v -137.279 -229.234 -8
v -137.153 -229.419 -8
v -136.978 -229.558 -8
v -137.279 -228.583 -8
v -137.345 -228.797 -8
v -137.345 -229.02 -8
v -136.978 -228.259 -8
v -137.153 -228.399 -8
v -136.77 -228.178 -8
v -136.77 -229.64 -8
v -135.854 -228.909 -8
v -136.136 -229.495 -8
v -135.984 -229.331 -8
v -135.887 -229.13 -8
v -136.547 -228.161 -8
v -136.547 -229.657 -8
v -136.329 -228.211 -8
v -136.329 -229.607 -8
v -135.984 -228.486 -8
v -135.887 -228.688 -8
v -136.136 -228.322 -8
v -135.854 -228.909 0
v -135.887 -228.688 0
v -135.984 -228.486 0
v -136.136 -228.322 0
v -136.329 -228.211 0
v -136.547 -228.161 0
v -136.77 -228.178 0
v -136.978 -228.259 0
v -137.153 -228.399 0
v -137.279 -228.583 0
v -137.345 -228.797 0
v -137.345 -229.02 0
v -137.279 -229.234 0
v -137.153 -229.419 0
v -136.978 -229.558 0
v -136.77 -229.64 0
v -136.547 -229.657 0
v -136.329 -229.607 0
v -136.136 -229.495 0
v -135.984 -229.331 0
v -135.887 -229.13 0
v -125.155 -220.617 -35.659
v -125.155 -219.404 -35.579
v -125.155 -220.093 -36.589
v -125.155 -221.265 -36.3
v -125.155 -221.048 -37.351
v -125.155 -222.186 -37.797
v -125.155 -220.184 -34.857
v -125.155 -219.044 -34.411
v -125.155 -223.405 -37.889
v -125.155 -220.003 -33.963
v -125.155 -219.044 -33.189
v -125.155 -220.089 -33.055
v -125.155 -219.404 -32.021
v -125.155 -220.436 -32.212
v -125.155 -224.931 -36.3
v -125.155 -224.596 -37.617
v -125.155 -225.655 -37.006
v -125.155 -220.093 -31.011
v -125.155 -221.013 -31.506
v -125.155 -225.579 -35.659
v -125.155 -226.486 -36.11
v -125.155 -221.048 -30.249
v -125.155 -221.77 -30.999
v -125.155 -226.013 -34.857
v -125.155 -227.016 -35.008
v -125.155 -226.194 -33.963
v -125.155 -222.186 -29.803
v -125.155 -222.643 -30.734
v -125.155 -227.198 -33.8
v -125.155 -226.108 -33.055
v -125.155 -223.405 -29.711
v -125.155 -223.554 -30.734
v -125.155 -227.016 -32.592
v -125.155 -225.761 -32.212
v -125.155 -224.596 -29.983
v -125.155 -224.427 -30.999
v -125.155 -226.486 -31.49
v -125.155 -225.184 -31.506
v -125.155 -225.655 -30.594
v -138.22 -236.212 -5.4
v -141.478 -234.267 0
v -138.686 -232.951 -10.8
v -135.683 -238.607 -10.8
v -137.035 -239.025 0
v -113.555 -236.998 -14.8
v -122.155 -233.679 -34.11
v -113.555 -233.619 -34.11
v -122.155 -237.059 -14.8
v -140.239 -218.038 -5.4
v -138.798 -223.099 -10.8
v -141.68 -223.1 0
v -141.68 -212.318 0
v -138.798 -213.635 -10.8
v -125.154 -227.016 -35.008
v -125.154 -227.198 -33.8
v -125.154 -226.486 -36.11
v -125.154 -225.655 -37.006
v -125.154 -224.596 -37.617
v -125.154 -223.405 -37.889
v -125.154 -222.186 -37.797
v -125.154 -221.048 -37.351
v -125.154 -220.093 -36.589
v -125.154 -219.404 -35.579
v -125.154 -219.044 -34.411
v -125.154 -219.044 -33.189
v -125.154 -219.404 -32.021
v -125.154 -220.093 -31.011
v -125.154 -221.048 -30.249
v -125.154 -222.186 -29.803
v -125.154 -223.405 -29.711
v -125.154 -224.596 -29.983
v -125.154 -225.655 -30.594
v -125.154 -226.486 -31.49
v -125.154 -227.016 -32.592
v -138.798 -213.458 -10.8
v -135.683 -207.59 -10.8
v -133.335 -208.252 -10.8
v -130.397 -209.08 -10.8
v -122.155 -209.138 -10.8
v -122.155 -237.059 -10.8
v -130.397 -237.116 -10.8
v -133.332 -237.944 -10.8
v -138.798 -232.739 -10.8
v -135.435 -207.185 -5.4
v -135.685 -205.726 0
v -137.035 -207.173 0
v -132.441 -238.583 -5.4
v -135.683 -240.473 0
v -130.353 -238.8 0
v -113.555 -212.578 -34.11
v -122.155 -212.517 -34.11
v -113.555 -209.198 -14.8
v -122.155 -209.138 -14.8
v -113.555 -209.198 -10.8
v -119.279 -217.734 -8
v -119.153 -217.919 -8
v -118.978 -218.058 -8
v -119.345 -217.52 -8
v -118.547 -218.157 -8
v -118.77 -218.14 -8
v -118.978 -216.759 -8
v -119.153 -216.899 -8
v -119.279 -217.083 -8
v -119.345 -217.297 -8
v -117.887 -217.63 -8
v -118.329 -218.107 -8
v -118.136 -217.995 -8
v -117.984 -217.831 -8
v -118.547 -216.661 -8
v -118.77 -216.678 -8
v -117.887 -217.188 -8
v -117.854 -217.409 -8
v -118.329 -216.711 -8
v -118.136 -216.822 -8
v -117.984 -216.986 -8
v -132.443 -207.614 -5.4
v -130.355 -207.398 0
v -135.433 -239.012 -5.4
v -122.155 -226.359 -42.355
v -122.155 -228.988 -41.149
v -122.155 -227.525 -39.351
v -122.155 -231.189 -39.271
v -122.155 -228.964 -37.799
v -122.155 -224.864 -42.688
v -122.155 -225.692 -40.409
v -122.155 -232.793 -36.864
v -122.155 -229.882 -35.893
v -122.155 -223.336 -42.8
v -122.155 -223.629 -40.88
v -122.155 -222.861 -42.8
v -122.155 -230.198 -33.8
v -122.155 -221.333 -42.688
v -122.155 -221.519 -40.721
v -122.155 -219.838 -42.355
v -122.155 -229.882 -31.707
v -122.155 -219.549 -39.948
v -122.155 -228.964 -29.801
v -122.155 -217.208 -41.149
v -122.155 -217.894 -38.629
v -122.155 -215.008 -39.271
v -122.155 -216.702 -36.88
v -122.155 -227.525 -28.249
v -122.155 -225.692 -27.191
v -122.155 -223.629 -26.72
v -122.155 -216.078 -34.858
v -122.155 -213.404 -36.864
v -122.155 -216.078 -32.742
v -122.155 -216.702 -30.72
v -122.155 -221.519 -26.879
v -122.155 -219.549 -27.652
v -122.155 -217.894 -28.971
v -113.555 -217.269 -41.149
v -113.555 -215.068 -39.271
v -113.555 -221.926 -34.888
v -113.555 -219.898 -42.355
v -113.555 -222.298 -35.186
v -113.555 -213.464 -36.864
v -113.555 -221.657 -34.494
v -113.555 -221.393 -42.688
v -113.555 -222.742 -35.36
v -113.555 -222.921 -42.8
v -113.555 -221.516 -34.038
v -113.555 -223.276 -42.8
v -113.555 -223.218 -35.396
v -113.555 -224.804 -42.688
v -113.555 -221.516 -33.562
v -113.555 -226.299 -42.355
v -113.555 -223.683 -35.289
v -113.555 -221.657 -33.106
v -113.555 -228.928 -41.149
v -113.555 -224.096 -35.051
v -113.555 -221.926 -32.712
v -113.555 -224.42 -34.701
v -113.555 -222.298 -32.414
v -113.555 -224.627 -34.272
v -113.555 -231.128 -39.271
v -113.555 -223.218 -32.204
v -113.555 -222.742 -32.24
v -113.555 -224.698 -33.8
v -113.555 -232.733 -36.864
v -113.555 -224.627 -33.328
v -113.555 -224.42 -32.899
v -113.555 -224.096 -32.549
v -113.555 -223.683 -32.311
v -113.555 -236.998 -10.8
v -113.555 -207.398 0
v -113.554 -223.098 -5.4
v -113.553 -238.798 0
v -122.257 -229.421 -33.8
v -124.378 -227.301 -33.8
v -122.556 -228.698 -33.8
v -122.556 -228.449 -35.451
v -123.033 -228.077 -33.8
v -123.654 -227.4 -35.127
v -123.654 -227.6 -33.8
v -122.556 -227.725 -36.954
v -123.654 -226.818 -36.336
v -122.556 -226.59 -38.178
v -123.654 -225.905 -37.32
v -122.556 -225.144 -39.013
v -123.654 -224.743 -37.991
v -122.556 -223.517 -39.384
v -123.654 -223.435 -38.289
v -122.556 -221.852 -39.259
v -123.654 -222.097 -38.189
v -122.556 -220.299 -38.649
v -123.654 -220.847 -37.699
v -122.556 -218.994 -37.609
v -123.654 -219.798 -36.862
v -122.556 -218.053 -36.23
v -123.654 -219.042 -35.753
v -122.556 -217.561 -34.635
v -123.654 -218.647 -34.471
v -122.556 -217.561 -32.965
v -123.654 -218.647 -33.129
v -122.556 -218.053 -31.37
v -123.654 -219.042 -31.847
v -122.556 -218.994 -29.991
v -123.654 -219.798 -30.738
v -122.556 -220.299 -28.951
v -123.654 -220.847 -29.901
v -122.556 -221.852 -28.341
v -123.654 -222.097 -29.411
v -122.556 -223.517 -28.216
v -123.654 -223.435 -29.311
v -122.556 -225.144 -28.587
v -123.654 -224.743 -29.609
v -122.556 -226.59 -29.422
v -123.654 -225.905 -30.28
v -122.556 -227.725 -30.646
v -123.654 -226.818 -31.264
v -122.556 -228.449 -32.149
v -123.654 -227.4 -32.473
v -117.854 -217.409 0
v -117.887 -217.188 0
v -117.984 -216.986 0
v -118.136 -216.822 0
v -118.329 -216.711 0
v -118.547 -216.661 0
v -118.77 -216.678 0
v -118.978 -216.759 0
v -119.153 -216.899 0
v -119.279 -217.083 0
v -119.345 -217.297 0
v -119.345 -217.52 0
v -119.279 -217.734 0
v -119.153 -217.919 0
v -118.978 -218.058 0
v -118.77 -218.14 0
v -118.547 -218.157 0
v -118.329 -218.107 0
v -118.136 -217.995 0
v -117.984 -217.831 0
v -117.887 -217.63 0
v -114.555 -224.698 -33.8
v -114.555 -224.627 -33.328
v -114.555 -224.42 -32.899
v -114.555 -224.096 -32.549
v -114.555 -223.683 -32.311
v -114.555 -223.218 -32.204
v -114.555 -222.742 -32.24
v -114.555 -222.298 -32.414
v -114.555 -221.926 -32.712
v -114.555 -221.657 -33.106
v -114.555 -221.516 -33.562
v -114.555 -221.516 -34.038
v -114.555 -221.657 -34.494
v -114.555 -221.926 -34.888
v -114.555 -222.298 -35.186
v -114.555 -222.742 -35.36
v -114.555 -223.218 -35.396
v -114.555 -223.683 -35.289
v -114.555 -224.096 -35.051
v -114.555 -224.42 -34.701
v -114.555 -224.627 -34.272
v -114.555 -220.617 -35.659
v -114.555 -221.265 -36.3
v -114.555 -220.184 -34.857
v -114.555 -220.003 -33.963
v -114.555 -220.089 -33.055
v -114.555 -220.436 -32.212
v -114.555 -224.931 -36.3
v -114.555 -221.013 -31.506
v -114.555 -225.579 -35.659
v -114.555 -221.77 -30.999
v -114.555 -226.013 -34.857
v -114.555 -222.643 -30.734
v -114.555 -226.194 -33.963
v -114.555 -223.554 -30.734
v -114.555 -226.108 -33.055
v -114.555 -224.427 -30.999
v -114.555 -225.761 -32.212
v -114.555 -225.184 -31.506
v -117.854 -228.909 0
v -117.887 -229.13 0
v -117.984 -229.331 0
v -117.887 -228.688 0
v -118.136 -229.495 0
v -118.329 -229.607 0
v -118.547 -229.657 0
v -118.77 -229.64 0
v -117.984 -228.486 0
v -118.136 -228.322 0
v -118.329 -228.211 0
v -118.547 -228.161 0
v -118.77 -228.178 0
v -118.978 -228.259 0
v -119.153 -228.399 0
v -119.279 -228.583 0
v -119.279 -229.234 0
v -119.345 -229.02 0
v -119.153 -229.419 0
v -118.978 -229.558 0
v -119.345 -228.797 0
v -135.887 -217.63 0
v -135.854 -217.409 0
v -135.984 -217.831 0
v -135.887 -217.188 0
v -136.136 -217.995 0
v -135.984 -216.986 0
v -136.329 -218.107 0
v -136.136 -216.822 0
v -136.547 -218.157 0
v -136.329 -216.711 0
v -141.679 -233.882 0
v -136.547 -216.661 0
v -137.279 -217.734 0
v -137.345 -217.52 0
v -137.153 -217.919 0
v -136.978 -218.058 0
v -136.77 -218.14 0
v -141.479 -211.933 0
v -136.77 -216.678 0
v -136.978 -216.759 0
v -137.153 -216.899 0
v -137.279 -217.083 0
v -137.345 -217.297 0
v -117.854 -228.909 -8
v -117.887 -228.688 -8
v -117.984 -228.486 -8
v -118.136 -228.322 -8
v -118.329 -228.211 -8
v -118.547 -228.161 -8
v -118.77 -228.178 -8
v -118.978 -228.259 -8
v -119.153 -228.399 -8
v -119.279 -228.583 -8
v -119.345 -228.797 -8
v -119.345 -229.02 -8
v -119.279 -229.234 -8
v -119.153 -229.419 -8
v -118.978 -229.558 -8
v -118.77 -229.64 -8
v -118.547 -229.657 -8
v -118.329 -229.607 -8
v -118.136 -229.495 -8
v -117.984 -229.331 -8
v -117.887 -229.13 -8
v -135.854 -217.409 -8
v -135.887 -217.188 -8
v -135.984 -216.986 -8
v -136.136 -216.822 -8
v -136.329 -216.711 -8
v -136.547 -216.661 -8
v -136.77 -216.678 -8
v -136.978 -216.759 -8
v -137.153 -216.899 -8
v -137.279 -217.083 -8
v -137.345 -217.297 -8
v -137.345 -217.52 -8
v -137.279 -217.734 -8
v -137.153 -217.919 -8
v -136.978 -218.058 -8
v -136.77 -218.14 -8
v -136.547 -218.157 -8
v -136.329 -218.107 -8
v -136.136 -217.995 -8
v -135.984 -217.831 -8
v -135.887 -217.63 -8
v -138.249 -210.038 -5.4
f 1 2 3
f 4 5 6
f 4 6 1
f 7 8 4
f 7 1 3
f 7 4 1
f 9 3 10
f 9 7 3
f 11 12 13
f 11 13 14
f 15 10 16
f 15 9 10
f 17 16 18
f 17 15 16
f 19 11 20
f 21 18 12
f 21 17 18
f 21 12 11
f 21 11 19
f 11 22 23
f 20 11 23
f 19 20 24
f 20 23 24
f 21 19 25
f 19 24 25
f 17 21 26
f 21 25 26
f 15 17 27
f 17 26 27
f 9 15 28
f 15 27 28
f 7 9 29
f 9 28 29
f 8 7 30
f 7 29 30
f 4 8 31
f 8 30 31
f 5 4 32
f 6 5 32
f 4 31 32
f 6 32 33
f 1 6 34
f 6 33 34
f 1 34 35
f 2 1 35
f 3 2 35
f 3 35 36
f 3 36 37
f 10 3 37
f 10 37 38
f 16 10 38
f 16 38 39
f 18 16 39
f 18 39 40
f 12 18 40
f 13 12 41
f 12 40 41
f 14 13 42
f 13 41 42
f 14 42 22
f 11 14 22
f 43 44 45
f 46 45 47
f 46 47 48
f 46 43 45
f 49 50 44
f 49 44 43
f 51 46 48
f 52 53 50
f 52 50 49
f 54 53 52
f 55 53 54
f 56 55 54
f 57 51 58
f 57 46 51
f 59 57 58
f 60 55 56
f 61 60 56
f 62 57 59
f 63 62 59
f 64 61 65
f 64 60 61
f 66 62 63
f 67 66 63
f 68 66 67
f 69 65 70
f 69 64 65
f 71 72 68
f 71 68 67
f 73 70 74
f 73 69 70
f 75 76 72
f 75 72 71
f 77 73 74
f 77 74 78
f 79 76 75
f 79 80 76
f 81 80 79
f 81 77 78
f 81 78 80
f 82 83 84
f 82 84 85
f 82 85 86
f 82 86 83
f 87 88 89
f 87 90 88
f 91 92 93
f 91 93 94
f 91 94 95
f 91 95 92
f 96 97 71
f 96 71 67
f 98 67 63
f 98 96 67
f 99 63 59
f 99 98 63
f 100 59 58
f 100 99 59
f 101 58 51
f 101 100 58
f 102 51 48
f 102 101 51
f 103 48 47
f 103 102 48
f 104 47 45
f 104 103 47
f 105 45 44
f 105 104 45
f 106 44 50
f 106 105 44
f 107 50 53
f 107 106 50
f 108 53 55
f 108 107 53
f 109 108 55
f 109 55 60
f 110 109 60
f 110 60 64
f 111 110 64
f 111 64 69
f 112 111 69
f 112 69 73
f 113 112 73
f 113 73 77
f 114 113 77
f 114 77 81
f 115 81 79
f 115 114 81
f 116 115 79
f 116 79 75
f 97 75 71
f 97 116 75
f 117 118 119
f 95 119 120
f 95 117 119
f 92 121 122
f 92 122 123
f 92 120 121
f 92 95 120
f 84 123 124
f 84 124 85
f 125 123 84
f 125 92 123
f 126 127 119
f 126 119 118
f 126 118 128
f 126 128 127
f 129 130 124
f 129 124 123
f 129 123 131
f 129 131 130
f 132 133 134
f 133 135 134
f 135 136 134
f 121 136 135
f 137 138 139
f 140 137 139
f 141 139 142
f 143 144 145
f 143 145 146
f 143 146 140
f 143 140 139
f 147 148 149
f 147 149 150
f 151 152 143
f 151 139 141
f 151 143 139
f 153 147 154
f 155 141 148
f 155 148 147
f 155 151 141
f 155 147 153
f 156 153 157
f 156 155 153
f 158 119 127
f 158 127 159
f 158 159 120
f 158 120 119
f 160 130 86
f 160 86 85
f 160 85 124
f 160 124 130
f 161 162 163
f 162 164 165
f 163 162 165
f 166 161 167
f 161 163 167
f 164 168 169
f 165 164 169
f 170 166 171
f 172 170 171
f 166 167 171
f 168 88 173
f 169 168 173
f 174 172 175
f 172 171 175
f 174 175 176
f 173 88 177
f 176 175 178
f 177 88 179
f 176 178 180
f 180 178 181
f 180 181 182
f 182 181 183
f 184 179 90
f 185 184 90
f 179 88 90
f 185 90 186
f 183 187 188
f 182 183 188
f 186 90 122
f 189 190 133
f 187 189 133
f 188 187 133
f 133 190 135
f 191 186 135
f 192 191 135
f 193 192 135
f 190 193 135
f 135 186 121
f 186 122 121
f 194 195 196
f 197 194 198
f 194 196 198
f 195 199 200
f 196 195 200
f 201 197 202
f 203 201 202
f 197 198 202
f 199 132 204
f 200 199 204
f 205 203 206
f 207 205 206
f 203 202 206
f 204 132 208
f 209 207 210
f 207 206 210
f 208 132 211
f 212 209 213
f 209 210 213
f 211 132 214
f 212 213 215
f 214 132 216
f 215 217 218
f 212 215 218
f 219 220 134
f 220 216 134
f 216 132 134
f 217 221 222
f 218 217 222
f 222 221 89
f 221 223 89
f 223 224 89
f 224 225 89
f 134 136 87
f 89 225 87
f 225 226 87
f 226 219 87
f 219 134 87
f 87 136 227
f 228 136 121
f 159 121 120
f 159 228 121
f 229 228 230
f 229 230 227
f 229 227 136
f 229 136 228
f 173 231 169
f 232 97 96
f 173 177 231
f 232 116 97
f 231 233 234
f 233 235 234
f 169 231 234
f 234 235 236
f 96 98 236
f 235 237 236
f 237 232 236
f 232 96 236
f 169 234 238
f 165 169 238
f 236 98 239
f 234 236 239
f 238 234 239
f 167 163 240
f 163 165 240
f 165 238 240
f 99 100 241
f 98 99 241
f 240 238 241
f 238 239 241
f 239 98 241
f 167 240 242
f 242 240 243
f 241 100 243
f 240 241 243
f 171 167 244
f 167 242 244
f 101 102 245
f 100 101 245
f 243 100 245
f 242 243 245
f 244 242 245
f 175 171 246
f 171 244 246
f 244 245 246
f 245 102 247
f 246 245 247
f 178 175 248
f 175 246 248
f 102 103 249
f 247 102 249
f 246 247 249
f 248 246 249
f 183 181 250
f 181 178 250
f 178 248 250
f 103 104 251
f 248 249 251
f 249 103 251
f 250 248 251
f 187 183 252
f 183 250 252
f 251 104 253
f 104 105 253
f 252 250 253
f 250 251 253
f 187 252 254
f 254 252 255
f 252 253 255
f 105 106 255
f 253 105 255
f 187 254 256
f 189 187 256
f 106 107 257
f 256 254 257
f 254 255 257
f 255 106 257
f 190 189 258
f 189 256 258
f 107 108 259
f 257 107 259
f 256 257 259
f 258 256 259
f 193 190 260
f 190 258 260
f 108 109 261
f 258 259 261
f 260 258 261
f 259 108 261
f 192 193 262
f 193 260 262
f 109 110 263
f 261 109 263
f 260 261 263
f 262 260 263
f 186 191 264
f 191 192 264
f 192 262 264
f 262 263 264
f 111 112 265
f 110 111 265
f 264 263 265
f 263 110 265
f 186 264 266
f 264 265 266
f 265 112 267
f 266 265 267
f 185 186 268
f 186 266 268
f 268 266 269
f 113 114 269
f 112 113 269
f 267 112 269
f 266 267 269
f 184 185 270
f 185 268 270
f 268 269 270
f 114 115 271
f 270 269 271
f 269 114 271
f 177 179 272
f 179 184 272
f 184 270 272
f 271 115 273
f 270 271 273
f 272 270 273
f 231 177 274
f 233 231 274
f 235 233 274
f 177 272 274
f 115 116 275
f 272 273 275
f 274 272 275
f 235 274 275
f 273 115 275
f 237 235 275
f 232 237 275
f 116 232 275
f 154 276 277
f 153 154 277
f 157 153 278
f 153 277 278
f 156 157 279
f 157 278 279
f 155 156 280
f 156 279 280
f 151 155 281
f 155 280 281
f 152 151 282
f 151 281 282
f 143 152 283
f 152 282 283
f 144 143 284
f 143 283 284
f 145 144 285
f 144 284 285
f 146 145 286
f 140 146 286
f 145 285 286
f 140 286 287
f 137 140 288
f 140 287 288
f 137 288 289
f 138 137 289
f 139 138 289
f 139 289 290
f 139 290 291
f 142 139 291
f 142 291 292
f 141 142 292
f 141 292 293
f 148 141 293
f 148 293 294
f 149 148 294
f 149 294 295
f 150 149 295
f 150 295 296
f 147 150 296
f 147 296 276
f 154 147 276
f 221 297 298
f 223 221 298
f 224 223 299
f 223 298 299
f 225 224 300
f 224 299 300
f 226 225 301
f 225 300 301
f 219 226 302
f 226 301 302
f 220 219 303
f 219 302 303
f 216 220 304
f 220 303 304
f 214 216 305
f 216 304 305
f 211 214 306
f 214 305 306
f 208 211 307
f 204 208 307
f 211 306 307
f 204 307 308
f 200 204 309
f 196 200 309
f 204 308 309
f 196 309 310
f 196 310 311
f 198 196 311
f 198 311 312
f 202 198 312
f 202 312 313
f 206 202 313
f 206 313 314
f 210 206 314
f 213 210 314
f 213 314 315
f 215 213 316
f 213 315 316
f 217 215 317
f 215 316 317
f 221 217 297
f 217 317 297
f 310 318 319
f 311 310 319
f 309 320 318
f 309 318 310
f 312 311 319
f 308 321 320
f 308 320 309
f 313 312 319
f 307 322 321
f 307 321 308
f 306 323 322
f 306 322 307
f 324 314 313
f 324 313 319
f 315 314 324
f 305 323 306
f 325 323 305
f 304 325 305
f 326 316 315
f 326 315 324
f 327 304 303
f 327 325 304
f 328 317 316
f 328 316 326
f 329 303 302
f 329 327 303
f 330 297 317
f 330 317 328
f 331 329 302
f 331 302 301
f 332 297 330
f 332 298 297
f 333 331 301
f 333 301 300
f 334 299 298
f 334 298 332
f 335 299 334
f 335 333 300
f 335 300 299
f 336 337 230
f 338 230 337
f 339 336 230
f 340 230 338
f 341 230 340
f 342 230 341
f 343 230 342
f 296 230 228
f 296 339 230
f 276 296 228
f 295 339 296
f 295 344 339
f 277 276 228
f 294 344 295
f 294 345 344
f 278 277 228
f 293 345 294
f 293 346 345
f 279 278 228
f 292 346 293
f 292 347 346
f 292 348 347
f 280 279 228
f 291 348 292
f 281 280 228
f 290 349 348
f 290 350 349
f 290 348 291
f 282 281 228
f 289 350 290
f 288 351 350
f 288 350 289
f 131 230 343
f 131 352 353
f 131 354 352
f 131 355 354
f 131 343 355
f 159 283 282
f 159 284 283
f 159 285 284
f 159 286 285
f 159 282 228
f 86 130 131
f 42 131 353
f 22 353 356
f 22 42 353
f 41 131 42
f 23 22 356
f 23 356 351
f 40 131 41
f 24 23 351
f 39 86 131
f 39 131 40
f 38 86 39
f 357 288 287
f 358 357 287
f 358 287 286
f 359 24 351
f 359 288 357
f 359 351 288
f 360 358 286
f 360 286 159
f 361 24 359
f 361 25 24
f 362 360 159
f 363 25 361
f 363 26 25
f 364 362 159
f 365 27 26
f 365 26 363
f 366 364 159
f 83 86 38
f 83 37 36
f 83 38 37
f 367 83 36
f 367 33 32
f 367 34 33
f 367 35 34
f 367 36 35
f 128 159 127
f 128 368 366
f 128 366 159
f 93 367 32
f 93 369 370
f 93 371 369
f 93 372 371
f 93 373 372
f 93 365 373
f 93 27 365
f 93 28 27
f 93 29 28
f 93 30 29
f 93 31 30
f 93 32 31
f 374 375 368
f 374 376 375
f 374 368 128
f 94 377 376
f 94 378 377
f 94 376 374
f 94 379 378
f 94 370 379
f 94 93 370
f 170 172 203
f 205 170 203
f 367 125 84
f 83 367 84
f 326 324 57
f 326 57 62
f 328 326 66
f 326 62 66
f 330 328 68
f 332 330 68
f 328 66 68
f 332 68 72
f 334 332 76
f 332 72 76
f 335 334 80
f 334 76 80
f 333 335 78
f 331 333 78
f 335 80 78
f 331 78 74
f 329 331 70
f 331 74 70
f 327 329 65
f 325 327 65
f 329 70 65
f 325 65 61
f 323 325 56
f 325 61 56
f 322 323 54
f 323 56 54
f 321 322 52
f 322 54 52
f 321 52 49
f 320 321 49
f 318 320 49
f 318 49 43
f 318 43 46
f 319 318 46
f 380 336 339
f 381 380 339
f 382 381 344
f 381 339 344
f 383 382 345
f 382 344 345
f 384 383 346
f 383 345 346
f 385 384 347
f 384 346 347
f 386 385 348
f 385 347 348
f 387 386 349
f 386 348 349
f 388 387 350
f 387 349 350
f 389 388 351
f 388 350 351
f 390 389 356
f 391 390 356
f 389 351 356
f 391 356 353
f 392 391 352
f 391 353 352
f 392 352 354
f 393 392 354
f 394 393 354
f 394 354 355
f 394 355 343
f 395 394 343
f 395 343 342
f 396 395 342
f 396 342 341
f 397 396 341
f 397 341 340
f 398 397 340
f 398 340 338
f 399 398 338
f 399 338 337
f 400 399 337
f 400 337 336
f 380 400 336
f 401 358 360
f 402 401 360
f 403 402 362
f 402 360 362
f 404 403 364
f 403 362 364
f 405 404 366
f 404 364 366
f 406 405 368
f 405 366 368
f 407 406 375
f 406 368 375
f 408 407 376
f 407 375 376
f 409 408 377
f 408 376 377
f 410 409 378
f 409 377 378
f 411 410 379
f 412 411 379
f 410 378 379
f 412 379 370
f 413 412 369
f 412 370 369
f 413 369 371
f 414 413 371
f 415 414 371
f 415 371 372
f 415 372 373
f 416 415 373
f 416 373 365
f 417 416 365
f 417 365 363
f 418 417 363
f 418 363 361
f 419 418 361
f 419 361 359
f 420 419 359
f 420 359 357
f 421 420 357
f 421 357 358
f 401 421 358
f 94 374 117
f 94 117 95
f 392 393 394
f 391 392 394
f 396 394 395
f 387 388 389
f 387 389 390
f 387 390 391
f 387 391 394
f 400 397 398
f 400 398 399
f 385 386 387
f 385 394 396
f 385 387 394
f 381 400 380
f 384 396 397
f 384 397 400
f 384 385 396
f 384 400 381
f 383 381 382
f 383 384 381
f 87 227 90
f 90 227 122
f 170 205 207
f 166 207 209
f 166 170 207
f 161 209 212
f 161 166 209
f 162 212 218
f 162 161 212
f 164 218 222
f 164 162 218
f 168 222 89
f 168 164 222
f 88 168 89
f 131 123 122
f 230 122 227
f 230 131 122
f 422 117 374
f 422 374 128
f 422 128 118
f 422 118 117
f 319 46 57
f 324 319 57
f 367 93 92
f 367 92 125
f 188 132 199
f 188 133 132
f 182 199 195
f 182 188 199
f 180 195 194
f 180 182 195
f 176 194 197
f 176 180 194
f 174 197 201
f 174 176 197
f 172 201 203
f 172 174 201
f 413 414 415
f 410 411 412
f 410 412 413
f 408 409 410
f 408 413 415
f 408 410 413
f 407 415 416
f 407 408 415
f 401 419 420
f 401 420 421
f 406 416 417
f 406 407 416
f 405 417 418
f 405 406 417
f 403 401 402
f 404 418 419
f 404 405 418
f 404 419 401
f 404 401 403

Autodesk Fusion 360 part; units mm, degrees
sketch "Support moteur/Cam" plane through (0, 0, 0) normal (0, 0, 1) x (1, 0, 0)
  line L0 (-113.5546, -207.3984) -> (-130.3546, -207.3984)
  line L1 (-130.3546, -207.3984) -> (-135.6849, -205.7263)
  line L2 (-135.6849, -205.7263) -> (-141.4789, -211.9329)
  line L3 (-141.4789, -211.9329) -> (-141.6802, -212.3176)
  line L4 (-141.6802, -212.3176) -> (-141.6802, -223.1)
  line L5 (-113.5528, -238.7984) -> (-130.3528, -238.8003)
  line L6 (-130.3528, -238.8003) -> (-135.6829, -240.4729)
  line L7 (-141.4776, -234.267) -> (-141.679, -233.8823)
  line L8 (-141.679, -233.8823) -> (-141.6802, -223.1)
  line L9 (-135.6829, -240.4729) -> (-141.4776, -234.267)
  circle A0 centre (-136.6035, -217.4087) radius 0.75
  circle A1 centre (-118.6035, -217.4087) radius 0.75
  circle A2 centre (-136.6035, -228.9087) radius 0.75
  circle A3 centre (-118.6035, -228.9087) radius 0.75
  line L10 (-113.5546, -207.3984) -> (-113.5528, -238.7984)
  line L11 (-141.6802, -223.1) -> (-113.5537, -223.0984)
  point P0 (-136.6035, -217.4087)
  point P1 (-118.6035, -217.4087)
  point P2 (-118.6035, -228.9087)
  point P3 (-136.6035, -228.9087)
  dimension "d217" = 16.8
  dimension "d227" = 1.5
  dimension "d228" = 1.5
  dimension "d229" = 1.5
  dimension "d230" = 1.5
ref_plane "WorkPlane9" through (0, 0, -10.8) normal (0, 0, 1) x (1, 0, 0)
sketch "Support moteur/Cam2" plane through (0, 0, -10.8) normal (0, 0, 1) x (1, 0, 0)
  line L0 (-113.5546, -236.9984) -> (-130.3974, -237.1164)
  line L1 (-130.3974, -237.1164) -> (-135.6833, -238.6066)
  line L2 (-135.6833, -238.6066) -> (-138.7984, -232.7391)
  line L3 (-138.7984, -223.0984) -> (-138.7984, -232.7391)
  line L4 (-138.7984, -223.0984) -> (-138.7984, -213.4577)
  line L5 (-135.6833, -207.5901) -> (-138.7984, -213.4577)
  line L6 (-130.3974, -209.0804) -> (-135.6833, -207.5901)
  line L7 (-113.5546, -209.1984) -> (-130.3974, -209.0804)
  line L8 (-122.1546, -237.0587) -> (-122.1546, -209.1381)
  line L9 (-113.5546, -209.1984) -> (-113.5546, -236.9984)
  line L10 (-138.7984, -223.0984) -> (-113.5546, -223.0984) construction
  dimension "d221" = 8.6
loft "Loft1" add profiles "Support moteur/Cam2", "Support moteur/Cam" section 1 section 2 contours L0 L1 L2 L3 L4 L10 L11 | L5 L6 L7 L8 L9 L10 L11 | A0 | A1
extrude "Support Moteur/Cam" cut sketch "Support moteur/Cam" against normal blind 8 contours A0 | A1 | A2 | A3
extrude "Extrude10" add sketch "Support moteur/Cam2" against normal blind 32 contours L0 L7 L8 L9
chamfer "Chamfer3" distance 4.9 distance2 28 2 edges at (-117.8546, -209.1683, -42.8) (-117.8546, -237.0285, -42.8) measured on face at (-119.2879, -218.4651, -42.8) measured on face at (-119.2879, -218.4651, -42.8)
fillet "Fillet1" radius 10.5 2 edges at (-117.8546, -232.1284, -42.8) (-117.8546, -214.0684, -42.8)
sketch "Support moteur/Cam3" plane through (-122.1546, 0, 0) normal (-1, 0, 0) x (0, -1, 0)
  ellipse E0 centre (222.8605, -32.3) end of major axis (212.3603, -32.3) minor radius 10.5 (212.5175, -34.11) -> (222.8605, -42.8) ccw
  line L0 (222.8605, -42.8) -> (223.3362, -42.8)
  ellipse E1 centre (223.3362, -32.3) end of major axis (233.8365, -32.3) minor radius 10.5 (223.3362, -42.8) -> (233.6793, -34.11) ccw
  line L1 (233.6793, -34.11) -> (237.0587, -14.8)
  line L2 (237.0587, -14.8) -> (237.0587, -10.8)
  line L3 (237.0587, -10.8) -> (209.1381, -10.8)
  line L4 (209.1381, -10.8) -> (209.1381, -14.8)
  line L5 (209.1381, -14.8) -> (212.5175, -34.11)
  line L6 (223.0984, -10.8) -> (223.0984, -28.5) construction
  line L7 (229.2984, -32.0796) -> (229.2984, -24.9204) construction
  line L8 (229.2984, -24.9204) -> (223.0984, -21.3409) construction
  line L9 (223.0984, -21.3409) -> (216.8984, -24.9204) construction
  line L10 (216.8984, -24.9204) -> (216.8984, -32.0796) construction
  line L11 (216.8984, -32.0796) -> (223.0984, -35.6591) construction
  line L12 (223.0984, -35.6591) -> (229.2984, -32.0796) construction
  circle A0 centre (223.0984, -28.5) radius 2.25 construction
  line L13 (223.0984, -10.8) -> (223.0984, -33.8) construction
  circle A1 centre (223.0984, -33.8) radius 1.6
  circle A2 centre (223.0984, -33.8) radius 3.1
  line L14 (217.8116, -36.9) -> (223.0984, -36.9) construction
  line L15 (221.2654, -36.3) -> (224.9314, -36.3)
  circle A3 centre (223.0984, -33.8) radius 4.1
  point P0 (223.0984, -28.5)
  dimension "d233" = 17.7
  dimension "d235" = 12.4
  dimension "d236" = 4.5
  dimension "d380" = 23
  dimension "d381" = 3.2
  dimension "d382" = 6.2
  dimension "d383" = 0.6
  dimension "d384" = 8.2
extrude "Extrude12" cut sketch "Support moteur/Cam3" against normal through all contours A1
extrude "Extrude13" cut sketch "Support moteur/Cam3" against normal blind 7.6 contours A2 L15 picked at (223.1382, -35.9985)
extrude "Extrude19" add sketch "Support moteur/Cam3" along normal blind 3 contours A2 L15 | A3 picked at (223.5866, -36.3774)
fillet "Fillet2" radius 3 1 edges at (-122.1546, -219.2758, -32.3174)
equation "Trous_Vis_diam2 = 2.2 mm"
